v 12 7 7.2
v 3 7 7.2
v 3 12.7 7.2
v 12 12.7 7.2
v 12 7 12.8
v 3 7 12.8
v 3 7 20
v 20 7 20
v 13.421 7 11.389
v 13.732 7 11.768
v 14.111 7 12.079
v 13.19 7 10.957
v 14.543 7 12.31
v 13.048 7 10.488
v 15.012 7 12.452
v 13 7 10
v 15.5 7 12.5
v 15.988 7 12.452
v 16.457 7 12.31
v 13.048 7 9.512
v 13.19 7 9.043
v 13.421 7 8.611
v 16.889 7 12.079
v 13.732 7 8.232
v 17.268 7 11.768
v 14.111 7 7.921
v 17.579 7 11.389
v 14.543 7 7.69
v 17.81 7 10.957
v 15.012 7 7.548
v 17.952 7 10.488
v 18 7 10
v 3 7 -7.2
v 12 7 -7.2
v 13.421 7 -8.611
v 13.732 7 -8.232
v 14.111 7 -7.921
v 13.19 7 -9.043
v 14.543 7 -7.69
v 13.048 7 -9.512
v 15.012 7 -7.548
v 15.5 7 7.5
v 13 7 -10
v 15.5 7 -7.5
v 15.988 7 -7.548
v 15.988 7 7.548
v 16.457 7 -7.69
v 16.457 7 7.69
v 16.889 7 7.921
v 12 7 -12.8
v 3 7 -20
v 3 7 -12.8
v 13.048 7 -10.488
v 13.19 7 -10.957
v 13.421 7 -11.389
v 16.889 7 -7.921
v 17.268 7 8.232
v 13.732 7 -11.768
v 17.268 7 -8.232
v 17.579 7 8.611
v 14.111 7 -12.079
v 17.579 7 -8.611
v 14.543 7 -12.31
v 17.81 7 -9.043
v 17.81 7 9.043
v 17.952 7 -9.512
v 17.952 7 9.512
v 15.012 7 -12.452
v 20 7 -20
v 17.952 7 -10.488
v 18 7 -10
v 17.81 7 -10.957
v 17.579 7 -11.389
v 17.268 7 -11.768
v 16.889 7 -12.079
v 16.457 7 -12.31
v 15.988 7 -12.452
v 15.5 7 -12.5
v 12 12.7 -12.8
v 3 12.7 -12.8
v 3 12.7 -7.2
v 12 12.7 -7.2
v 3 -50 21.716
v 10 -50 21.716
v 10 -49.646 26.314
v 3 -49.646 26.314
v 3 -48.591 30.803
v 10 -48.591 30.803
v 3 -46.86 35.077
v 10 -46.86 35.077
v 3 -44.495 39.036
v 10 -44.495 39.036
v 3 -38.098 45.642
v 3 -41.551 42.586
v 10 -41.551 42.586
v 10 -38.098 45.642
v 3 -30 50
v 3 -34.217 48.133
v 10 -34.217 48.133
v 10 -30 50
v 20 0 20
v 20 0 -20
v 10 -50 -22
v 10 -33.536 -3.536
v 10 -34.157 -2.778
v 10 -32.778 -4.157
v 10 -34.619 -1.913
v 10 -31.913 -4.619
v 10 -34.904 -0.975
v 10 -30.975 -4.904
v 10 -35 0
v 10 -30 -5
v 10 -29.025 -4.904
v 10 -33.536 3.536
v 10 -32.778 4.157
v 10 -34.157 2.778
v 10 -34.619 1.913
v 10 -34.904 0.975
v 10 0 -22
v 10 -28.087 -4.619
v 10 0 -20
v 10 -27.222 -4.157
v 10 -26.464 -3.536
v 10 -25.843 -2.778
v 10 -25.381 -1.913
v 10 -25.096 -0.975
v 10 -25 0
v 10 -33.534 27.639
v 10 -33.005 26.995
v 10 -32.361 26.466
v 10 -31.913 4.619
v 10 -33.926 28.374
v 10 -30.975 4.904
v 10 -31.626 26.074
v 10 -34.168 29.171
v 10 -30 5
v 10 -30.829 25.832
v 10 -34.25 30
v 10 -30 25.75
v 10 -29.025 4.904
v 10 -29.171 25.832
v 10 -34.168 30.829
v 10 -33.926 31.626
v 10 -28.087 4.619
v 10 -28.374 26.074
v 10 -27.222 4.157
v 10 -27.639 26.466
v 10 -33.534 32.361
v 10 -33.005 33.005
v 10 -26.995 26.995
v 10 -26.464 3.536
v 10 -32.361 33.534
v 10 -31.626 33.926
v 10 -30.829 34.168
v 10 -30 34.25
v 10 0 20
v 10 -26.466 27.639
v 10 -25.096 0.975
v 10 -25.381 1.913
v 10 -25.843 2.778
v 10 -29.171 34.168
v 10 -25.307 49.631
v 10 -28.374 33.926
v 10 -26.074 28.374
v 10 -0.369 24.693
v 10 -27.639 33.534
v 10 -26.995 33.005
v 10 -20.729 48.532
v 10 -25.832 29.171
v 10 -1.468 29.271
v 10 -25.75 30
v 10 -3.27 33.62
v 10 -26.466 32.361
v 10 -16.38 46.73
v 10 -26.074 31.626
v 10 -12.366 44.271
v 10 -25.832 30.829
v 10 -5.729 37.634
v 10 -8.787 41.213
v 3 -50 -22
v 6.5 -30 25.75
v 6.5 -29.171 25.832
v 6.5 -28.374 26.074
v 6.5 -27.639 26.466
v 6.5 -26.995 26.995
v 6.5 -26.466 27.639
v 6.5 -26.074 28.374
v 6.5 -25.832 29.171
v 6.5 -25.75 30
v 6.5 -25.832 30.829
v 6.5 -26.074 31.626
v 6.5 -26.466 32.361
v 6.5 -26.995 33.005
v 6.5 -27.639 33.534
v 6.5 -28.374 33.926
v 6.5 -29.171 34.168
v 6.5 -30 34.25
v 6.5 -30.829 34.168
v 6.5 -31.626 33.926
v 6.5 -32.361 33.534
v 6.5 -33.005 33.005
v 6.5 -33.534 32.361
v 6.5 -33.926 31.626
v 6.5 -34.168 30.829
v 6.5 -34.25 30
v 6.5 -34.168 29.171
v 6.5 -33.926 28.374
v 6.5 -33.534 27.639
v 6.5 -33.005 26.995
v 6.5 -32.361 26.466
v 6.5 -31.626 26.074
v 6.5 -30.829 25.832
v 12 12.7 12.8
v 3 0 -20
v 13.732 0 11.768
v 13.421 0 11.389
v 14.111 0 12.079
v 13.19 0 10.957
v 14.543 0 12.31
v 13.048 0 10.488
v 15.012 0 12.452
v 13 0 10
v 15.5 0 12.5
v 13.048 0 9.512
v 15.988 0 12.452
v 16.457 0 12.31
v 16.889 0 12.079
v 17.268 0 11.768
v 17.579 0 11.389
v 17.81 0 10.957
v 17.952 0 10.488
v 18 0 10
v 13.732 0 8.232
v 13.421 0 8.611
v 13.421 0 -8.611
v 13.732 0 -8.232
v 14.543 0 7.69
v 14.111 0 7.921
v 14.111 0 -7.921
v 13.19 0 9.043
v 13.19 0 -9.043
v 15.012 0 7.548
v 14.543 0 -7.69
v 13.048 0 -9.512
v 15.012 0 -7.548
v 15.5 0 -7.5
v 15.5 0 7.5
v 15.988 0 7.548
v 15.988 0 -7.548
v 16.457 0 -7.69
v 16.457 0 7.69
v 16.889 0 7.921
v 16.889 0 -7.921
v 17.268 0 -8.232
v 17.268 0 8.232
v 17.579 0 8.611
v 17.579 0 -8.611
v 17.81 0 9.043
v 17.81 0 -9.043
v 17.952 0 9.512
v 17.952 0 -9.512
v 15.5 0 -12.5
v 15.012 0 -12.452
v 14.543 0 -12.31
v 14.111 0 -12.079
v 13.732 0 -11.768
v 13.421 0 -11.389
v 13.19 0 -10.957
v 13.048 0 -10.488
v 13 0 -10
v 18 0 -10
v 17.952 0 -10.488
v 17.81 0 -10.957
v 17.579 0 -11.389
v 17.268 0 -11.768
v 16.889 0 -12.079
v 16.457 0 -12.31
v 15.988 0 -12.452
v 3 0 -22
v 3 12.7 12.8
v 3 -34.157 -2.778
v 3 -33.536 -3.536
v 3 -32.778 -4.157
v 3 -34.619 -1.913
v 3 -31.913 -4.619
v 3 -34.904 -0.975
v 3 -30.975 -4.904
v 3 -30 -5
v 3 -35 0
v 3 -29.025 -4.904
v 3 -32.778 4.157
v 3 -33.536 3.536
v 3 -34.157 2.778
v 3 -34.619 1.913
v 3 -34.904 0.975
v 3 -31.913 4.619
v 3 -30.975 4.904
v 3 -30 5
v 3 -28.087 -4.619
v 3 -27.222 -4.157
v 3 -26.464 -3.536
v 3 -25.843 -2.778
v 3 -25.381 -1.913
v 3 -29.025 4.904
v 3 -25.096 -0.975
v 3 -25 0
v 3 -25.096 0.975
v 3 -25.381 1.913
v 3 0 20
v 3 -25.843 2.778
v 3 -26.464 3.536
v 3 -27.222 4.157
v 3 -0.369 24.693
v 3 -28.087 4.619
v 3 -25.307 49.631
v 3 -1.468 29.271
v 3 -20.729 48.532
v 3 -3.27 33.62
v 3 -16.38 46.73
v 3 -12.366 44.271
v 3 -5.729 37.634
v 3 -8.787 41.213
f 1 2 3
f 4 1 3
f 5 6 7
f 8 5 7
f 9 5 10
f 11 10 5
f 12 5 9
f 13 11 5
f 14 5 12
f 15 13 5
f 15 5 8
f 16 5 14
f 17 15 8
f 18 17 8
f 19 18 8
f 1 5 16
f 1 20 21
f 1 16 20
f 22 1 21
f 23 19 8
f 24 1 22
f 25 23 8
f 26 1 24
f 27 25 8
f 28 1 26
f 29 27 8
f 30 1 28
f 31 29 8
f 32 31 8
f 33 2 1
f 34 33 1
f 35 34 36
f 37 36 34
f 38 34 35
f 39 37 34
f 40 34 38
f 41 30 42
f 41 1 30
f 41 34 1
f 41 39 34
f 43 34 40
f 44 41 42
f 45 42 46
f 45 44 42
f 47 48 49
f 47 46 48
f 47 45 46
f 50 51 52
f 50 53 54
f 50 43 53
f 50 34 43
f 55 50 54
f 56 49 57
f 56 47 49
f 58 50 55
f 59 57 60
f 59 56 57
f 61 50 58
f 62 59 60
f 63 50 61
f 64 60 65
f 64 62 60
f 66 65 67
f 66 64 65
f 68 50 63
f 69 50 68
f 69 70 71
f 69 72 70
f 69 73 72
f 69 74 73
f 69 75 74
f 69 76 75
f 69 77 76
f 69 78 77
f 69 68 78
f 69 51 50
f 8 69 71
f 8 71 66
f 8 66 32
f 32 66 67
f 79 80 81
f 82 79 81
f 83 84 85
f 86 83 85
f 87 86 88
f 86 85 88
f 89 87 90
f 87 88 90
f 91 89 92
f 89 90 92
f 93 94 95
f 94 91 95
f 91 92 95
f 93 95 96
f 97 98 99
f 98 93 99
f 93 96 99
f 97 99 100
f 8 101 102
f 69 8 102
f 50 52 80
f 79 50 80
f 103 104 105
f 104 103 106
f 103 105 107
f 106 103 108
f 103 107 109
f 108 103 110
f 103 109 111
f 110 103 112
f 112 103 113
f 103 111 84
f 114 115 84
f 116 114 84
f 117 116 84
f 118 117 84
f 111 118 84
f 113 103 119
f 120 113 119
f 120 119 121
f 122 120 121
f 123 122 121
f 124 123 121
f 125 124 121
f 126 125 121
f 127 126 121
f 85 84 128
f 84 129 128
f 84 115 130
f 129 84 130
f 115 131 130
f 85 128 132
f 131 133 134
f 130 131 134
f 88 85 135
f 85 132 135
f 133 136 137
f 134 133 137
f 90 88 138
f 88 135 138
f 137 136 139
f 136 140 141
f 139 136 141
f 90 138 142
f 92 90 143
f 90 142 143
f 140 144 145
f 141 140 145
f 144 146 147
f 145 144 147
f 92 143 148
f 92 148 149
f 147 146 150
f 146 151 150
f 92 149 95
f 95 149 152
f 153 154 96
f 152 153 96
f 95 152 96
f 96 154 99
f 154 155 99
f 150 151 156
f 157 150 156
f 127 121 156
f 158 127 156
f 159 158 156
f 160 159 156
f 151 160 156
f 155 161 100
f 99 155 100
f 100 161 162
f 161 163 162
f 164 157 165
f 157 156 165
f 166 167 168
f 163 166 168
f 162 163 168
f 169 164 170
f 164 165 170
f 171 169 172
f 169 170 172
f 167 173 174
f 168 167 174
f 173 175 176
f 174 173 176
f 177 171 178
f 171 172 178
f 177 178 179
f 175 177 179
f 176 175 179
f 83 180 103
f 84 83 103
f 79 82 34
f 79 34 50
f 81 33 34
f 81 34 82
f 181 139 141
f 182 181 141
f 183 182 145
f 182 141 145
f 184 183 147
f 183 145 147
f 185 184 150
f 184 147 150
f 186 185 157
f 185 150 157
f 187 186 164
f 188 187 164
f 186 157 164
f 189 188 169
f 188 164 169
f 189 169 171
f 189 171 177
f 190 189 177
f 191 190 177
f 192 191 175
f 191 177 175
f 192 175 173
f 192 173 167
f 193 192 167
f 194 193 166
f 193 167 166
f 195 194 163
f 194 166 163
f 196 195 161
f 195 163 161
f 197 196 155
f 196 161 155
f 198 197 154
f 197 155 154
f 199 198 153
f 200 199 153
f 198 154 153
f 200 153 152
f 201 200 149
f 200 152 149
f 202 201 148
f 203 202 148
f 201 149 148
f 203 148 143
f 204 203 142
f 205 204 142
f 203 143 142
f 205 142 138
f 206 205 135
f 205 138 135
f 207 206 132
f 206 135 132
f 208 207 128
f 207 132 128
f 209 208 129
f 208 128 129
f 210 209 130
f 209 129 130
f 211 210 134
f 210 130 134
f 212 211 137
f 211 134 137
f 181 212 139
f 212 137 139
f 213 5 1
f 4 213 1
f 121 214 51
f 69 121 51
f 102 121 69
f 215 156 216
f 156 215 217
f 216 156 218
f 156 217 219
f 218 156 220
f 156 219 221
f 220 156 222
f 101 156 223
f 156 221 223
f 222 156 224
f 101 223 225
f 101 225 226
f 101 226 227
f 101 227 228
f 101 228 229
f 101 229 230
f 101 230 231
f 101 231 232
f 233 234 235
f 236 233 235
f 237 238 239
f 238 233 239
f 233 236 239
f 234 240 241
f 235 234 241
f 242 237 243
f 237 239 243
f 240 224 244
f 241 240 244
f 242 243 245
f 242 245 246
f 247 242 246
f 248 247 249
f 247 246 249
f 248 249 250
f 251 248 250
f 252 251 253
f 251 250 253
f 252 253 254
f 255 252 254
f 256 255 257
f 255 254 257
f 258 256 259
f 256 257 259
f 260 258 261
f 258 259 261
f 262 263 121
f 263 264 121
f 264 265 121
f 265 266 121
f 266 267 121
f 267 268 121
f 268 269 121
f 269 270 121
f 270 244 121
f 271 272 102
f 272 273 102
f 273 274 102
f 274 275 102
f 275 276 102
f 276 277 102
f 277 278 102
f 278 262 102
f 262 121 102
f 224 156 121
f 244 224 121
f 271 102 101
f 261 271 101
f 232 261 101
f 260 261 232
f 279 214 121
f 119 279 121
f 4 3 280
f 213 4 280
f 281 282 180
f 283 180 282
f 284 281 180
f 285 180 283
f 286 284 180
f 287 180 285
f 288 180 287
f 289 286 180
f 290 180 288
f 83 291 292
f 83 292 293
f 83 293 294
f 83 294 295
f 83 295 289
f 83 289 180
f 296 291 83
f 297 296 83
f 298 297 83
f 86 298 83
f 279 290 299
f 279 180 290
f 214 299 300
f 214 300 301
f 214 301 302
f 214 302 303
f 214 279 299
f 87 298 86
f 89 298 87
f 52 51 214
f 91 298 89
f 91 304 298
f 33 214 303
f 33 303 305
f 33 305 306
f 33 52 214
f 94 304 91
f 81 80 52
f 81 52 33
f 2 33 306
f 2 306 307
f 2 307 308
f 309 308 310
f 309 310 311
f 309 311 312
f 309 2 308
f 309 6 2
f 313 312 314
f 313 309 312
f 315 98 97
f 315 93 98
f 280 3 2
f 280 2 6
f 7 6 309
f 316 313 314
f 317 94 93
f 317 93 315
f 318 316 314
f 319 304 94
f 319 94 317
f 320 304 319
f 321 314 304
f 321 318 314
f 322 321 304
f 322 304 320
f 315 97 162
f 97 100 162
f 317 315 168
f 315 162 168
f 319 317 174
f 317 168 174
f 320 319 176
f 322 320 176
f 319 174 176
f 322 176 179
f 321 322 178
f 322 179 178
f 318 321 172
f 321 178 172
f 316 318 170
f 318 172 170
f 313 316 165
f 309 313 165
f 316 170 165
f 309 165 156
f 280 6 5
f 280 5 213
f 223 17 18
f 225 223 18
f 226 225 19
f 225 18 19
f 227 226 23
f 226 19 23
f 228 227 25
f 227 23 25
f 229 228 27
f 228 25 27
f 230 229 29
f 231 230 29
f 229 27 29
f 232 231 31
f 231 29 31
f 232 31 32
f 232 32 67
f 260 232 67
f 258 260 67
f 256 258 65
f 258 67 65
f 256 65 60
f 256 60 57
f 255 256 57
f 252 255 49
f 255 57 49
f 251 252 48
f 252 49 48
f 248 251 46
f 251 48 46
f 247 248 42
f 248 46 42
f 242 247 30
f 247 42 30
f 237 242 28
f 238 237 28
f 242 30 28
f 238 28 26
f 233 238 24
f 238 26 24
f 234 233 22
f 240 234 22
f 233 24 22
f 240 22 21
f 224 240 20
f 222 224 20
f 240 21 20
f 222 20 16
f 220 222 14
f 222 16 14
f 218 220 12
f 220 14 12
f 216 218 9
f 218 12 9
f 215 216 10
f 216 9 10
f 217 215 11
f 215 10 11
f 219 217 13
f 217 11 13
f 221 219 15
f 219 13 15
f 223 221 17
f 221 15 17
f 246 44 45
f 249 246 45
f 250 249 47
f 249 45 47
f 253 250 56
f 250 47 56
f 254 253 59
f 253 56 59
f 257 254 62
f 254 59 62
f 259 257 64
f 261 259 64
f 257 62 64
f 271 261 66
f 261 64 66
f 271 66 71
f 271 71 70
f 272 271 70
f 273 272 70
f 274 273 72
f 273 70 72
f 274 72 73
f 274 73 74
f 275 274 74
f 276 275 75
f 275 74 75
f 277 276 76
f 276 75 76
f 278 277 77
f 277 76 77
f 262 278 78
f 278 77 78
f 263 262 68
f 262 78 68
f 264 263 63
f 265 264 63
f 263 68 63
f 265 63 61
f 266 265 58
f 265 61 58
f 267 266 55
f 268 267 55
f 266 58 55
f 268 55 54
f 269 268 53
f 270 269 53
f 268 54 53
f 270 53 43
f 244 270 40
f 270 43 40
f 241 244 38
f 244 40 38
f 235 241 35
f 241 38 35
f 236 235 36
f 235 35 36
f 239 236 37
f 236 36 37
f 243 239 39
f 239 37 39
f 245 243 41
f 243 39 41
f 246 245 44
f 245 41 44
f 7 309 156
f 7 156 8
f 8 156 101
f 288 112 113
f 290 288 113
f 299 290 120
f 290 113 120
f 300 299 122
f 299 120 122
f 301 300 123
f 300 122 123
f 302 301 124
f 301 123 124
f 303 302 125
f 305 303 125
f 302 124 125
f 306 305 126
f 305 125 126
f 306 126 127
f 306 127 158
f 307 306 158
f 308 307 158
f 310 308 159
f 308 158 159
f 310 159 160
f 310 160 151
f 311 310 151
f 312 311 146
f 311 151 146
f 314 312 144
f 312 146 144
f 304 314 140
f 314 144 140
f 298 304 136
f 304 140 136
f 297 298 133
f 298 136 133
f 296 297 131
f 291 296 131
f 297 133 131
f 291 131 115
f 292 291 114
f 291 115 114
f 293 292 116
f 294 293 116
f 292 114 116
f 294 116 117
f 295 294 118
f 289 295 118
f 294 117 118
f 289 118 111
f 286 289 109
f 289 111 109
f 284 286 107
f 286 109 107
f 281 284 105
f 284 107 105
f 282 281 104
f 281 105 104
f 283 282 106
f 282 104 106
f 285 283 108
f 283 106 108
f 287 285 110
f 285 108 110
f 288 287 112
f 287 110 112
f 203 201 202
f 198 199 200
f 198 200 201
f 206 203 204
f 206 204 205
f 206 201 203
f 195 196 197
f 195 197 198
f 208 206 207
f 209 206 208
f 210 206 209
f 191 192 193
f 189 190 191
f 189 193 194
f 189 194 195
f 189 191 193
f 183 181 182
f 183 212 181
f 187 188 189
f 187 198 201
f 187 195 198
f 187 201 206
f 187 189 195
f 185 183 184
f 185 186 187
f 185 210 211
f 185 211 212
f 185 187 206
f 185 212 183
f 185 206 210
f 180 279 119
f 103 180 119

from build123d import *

# Parameters (mm, degrees)
CROQUIS1_W              = 40
CROQUIS1_H              = 40
SALIENTE_EXTRUIR1_DEPTH = 7
CROQUIS3_W              = 5.6
CROQUIS3_H              = 5.7
SALIENTE_EXTRUIR3_DEPTH = 40
CROQUIS19_W             = 8
CROQUIS19_H             = 40
CORTAR_EXTRUIR5_DEPTH   = 5.7
CROQUIS20_R             = 2.5
CORTAR_EXTRUIR6_DEPTH   = 7
CROQUIS21_W             = 7
CROQUIS21_H             = 72
SALIENTE_EXTRUIR4_DEPTH = 50
CROQUIS22_R             = 5
CORTAR_EXTRUIR7_DEPTH   = 7
CROQUIS25_R             = 4.25
CORTAR_EXTRUIR8_DEPTH   = 3.5
REDONDEO1_R             = 30
REDONDEO2_R             = 30
CROQUIS29_W             = 103.753326912
CROQUIS29_H             = 179.412983462
CORTAR_EXTRUIR9_DEPTH   = 23


# Some blends are built 0.0001 mm under size
with BuildPart() as part:
    # Croquis1 → Saliente-Extruir1 (new body)
    with BuildSketch(Plane(origin=(0, 0, 0), x_dir=(1, 0, 0), z_dir=(0, 1, 0))):
        Rectangle(CROQUIS1_W, CROQUIS1_H)
    extrude(amount=SALIENTE_EXTRUIR1_DEPTH)

    # Croquis3 → Saliente-Extruir3 (add)
    with BuildSketch(Plane.ZY.offset(20)):
        with Locations((10, 9.85)):
            Rectangle(CROQUIS3_W, CROQUIS3_H)
        with Locations((-10, 9.85)):
            Rectangle(CROQUIS3_W, CROQUIS3_H)
    extrude(amount=-SALIENTE_EXTRUIR3_DEPTH)

    # Croquis19 → Cortar-Extruir5 (cut)
    with BuildSketch(Plane(origin=(0, 12.7, 0), x_dir=(1, 0, 0), z_dir=(0, 1, 0))):
        with Locations((-16, 0)):
            Rectangle(CROQUIS19_W, CROQUIS19_H)
        with Locations((16, 0)):
            Rectangle(CROQUIS19_W, CROQUIS19_H)
    extrude(amount=-CORTAR_EXTRUIR5_DEPTH, mode=Mode.SUBTRACT)

    # Croquis20 → Cortar-Extruir6 (cut)
    with BuildSketch(Plane(origin=(0, 7, 0), x_dir=(1, 0, 0), z_dir=(0, 1, 0))):
        with Locations(Location((-15.5, 10, 0), (0, 0, 270))):
            Circle(CROQUIS20_R)
        with Locations(Location((15.5, 10, 0), (0, 0, 270))):
            Circle(CROQUIS20_R)
        with Locations(Location((15.5, -10, 0), (0, 0, 270))):
            Circle(CROQUIS20_R)
        with Locations(Location((-15.5, -10, 0), (0, 0, 270))):
            Circle(CROQUIS20_R)
    extrude(amount=-CORTAR_EXTRUIR6_DEPTH, mode=Mode.SUBTRACT)

    # Croquis21 → Saliente-Extruir4 (add)
    with BuildSketch(Plane.XZ):
        with Locations((6.5, 14)):
            Rectangle(CROQUIS21_W, CROQUIS21_H)
    extrude(amount=SALIENTE_EXTRUIR4_DEPTH)

    # Croquis22 → Cortar-Extruir7 (cut)
    with BuildSketch(Plane(origin=(10, 0, 0), x_dir=(0, 0, -1), z_dir=(1, 0, 0))):
        with Locations((0, -30)):
            Circle(CROQUIS22_R)
    extrude(amount=-CORTAR_EXTRUIR7_DEPTH, mode=Mode.SUBTRACT)

    # Croquis25 → Cortar-Extruir8 (cut)
    with BuildSketch(Plane(origin=(10, 0, 0), x_dir=(0, 0, -1), z_dir=(1, 0, 0))):
        with Locations((-30, -30)):
            Circle(CROQUIS25_R)
    extrude(amount=-CORTAR_EXTRUIR8_DEPTH, mode=Mode.SUBTRACT)

    # Redondeo1
    redondeo1_edges = [part.edges().sort_by_distance(p)[0] for p in [
        (6.5, 0, 50),
    ]]
    fillet(redondeo1_edges, radius=REDONDEO1_R - 0.0001)  # a hair under: the kernel refuses the full size

    # Redondeo2
    # the kernel refuses this fillet: 30 mm, written as the material it takes off along each edge
    with BuildSketch(Plane(origin=(80.710766507, -50, 50), x_dir=(0, 1, 0), z_dir=(-1, 0, 0))) as redondeo2_piece_1:
        with BuildLine():
            CenterArc((30, 28.284306603), REDONDEO2_R, 180, 70.528981937)
            Line((0, 28.284306603), (-0.6, 28.284306603))
            Line((-0.6, 28.284306603), (-0.6, 0))
            Line((-0.6, 0), (0, -0.6))
            ThreePointArc((0, -0.6), (10.00005, -0.6), (19.800102, -0.565686132))
            Line((19.800102, -0.565686132), (20.0001, 0))
        make_face()
    extrude(amount=148.421533013, mode=Mode.SUBTRACT)

    # Croquis29 → Cortar-Extruir9 (cut)
    with BuildSketch(Plane.ZY.offset(20)):
        Rectangle(CROQUIS29_W, CROQUIS29_H)
    extrude(amount=-CORTAR_EXTRUIR9_DEPTH, mode=Mode.SUBTRACT)


solid = part.part
